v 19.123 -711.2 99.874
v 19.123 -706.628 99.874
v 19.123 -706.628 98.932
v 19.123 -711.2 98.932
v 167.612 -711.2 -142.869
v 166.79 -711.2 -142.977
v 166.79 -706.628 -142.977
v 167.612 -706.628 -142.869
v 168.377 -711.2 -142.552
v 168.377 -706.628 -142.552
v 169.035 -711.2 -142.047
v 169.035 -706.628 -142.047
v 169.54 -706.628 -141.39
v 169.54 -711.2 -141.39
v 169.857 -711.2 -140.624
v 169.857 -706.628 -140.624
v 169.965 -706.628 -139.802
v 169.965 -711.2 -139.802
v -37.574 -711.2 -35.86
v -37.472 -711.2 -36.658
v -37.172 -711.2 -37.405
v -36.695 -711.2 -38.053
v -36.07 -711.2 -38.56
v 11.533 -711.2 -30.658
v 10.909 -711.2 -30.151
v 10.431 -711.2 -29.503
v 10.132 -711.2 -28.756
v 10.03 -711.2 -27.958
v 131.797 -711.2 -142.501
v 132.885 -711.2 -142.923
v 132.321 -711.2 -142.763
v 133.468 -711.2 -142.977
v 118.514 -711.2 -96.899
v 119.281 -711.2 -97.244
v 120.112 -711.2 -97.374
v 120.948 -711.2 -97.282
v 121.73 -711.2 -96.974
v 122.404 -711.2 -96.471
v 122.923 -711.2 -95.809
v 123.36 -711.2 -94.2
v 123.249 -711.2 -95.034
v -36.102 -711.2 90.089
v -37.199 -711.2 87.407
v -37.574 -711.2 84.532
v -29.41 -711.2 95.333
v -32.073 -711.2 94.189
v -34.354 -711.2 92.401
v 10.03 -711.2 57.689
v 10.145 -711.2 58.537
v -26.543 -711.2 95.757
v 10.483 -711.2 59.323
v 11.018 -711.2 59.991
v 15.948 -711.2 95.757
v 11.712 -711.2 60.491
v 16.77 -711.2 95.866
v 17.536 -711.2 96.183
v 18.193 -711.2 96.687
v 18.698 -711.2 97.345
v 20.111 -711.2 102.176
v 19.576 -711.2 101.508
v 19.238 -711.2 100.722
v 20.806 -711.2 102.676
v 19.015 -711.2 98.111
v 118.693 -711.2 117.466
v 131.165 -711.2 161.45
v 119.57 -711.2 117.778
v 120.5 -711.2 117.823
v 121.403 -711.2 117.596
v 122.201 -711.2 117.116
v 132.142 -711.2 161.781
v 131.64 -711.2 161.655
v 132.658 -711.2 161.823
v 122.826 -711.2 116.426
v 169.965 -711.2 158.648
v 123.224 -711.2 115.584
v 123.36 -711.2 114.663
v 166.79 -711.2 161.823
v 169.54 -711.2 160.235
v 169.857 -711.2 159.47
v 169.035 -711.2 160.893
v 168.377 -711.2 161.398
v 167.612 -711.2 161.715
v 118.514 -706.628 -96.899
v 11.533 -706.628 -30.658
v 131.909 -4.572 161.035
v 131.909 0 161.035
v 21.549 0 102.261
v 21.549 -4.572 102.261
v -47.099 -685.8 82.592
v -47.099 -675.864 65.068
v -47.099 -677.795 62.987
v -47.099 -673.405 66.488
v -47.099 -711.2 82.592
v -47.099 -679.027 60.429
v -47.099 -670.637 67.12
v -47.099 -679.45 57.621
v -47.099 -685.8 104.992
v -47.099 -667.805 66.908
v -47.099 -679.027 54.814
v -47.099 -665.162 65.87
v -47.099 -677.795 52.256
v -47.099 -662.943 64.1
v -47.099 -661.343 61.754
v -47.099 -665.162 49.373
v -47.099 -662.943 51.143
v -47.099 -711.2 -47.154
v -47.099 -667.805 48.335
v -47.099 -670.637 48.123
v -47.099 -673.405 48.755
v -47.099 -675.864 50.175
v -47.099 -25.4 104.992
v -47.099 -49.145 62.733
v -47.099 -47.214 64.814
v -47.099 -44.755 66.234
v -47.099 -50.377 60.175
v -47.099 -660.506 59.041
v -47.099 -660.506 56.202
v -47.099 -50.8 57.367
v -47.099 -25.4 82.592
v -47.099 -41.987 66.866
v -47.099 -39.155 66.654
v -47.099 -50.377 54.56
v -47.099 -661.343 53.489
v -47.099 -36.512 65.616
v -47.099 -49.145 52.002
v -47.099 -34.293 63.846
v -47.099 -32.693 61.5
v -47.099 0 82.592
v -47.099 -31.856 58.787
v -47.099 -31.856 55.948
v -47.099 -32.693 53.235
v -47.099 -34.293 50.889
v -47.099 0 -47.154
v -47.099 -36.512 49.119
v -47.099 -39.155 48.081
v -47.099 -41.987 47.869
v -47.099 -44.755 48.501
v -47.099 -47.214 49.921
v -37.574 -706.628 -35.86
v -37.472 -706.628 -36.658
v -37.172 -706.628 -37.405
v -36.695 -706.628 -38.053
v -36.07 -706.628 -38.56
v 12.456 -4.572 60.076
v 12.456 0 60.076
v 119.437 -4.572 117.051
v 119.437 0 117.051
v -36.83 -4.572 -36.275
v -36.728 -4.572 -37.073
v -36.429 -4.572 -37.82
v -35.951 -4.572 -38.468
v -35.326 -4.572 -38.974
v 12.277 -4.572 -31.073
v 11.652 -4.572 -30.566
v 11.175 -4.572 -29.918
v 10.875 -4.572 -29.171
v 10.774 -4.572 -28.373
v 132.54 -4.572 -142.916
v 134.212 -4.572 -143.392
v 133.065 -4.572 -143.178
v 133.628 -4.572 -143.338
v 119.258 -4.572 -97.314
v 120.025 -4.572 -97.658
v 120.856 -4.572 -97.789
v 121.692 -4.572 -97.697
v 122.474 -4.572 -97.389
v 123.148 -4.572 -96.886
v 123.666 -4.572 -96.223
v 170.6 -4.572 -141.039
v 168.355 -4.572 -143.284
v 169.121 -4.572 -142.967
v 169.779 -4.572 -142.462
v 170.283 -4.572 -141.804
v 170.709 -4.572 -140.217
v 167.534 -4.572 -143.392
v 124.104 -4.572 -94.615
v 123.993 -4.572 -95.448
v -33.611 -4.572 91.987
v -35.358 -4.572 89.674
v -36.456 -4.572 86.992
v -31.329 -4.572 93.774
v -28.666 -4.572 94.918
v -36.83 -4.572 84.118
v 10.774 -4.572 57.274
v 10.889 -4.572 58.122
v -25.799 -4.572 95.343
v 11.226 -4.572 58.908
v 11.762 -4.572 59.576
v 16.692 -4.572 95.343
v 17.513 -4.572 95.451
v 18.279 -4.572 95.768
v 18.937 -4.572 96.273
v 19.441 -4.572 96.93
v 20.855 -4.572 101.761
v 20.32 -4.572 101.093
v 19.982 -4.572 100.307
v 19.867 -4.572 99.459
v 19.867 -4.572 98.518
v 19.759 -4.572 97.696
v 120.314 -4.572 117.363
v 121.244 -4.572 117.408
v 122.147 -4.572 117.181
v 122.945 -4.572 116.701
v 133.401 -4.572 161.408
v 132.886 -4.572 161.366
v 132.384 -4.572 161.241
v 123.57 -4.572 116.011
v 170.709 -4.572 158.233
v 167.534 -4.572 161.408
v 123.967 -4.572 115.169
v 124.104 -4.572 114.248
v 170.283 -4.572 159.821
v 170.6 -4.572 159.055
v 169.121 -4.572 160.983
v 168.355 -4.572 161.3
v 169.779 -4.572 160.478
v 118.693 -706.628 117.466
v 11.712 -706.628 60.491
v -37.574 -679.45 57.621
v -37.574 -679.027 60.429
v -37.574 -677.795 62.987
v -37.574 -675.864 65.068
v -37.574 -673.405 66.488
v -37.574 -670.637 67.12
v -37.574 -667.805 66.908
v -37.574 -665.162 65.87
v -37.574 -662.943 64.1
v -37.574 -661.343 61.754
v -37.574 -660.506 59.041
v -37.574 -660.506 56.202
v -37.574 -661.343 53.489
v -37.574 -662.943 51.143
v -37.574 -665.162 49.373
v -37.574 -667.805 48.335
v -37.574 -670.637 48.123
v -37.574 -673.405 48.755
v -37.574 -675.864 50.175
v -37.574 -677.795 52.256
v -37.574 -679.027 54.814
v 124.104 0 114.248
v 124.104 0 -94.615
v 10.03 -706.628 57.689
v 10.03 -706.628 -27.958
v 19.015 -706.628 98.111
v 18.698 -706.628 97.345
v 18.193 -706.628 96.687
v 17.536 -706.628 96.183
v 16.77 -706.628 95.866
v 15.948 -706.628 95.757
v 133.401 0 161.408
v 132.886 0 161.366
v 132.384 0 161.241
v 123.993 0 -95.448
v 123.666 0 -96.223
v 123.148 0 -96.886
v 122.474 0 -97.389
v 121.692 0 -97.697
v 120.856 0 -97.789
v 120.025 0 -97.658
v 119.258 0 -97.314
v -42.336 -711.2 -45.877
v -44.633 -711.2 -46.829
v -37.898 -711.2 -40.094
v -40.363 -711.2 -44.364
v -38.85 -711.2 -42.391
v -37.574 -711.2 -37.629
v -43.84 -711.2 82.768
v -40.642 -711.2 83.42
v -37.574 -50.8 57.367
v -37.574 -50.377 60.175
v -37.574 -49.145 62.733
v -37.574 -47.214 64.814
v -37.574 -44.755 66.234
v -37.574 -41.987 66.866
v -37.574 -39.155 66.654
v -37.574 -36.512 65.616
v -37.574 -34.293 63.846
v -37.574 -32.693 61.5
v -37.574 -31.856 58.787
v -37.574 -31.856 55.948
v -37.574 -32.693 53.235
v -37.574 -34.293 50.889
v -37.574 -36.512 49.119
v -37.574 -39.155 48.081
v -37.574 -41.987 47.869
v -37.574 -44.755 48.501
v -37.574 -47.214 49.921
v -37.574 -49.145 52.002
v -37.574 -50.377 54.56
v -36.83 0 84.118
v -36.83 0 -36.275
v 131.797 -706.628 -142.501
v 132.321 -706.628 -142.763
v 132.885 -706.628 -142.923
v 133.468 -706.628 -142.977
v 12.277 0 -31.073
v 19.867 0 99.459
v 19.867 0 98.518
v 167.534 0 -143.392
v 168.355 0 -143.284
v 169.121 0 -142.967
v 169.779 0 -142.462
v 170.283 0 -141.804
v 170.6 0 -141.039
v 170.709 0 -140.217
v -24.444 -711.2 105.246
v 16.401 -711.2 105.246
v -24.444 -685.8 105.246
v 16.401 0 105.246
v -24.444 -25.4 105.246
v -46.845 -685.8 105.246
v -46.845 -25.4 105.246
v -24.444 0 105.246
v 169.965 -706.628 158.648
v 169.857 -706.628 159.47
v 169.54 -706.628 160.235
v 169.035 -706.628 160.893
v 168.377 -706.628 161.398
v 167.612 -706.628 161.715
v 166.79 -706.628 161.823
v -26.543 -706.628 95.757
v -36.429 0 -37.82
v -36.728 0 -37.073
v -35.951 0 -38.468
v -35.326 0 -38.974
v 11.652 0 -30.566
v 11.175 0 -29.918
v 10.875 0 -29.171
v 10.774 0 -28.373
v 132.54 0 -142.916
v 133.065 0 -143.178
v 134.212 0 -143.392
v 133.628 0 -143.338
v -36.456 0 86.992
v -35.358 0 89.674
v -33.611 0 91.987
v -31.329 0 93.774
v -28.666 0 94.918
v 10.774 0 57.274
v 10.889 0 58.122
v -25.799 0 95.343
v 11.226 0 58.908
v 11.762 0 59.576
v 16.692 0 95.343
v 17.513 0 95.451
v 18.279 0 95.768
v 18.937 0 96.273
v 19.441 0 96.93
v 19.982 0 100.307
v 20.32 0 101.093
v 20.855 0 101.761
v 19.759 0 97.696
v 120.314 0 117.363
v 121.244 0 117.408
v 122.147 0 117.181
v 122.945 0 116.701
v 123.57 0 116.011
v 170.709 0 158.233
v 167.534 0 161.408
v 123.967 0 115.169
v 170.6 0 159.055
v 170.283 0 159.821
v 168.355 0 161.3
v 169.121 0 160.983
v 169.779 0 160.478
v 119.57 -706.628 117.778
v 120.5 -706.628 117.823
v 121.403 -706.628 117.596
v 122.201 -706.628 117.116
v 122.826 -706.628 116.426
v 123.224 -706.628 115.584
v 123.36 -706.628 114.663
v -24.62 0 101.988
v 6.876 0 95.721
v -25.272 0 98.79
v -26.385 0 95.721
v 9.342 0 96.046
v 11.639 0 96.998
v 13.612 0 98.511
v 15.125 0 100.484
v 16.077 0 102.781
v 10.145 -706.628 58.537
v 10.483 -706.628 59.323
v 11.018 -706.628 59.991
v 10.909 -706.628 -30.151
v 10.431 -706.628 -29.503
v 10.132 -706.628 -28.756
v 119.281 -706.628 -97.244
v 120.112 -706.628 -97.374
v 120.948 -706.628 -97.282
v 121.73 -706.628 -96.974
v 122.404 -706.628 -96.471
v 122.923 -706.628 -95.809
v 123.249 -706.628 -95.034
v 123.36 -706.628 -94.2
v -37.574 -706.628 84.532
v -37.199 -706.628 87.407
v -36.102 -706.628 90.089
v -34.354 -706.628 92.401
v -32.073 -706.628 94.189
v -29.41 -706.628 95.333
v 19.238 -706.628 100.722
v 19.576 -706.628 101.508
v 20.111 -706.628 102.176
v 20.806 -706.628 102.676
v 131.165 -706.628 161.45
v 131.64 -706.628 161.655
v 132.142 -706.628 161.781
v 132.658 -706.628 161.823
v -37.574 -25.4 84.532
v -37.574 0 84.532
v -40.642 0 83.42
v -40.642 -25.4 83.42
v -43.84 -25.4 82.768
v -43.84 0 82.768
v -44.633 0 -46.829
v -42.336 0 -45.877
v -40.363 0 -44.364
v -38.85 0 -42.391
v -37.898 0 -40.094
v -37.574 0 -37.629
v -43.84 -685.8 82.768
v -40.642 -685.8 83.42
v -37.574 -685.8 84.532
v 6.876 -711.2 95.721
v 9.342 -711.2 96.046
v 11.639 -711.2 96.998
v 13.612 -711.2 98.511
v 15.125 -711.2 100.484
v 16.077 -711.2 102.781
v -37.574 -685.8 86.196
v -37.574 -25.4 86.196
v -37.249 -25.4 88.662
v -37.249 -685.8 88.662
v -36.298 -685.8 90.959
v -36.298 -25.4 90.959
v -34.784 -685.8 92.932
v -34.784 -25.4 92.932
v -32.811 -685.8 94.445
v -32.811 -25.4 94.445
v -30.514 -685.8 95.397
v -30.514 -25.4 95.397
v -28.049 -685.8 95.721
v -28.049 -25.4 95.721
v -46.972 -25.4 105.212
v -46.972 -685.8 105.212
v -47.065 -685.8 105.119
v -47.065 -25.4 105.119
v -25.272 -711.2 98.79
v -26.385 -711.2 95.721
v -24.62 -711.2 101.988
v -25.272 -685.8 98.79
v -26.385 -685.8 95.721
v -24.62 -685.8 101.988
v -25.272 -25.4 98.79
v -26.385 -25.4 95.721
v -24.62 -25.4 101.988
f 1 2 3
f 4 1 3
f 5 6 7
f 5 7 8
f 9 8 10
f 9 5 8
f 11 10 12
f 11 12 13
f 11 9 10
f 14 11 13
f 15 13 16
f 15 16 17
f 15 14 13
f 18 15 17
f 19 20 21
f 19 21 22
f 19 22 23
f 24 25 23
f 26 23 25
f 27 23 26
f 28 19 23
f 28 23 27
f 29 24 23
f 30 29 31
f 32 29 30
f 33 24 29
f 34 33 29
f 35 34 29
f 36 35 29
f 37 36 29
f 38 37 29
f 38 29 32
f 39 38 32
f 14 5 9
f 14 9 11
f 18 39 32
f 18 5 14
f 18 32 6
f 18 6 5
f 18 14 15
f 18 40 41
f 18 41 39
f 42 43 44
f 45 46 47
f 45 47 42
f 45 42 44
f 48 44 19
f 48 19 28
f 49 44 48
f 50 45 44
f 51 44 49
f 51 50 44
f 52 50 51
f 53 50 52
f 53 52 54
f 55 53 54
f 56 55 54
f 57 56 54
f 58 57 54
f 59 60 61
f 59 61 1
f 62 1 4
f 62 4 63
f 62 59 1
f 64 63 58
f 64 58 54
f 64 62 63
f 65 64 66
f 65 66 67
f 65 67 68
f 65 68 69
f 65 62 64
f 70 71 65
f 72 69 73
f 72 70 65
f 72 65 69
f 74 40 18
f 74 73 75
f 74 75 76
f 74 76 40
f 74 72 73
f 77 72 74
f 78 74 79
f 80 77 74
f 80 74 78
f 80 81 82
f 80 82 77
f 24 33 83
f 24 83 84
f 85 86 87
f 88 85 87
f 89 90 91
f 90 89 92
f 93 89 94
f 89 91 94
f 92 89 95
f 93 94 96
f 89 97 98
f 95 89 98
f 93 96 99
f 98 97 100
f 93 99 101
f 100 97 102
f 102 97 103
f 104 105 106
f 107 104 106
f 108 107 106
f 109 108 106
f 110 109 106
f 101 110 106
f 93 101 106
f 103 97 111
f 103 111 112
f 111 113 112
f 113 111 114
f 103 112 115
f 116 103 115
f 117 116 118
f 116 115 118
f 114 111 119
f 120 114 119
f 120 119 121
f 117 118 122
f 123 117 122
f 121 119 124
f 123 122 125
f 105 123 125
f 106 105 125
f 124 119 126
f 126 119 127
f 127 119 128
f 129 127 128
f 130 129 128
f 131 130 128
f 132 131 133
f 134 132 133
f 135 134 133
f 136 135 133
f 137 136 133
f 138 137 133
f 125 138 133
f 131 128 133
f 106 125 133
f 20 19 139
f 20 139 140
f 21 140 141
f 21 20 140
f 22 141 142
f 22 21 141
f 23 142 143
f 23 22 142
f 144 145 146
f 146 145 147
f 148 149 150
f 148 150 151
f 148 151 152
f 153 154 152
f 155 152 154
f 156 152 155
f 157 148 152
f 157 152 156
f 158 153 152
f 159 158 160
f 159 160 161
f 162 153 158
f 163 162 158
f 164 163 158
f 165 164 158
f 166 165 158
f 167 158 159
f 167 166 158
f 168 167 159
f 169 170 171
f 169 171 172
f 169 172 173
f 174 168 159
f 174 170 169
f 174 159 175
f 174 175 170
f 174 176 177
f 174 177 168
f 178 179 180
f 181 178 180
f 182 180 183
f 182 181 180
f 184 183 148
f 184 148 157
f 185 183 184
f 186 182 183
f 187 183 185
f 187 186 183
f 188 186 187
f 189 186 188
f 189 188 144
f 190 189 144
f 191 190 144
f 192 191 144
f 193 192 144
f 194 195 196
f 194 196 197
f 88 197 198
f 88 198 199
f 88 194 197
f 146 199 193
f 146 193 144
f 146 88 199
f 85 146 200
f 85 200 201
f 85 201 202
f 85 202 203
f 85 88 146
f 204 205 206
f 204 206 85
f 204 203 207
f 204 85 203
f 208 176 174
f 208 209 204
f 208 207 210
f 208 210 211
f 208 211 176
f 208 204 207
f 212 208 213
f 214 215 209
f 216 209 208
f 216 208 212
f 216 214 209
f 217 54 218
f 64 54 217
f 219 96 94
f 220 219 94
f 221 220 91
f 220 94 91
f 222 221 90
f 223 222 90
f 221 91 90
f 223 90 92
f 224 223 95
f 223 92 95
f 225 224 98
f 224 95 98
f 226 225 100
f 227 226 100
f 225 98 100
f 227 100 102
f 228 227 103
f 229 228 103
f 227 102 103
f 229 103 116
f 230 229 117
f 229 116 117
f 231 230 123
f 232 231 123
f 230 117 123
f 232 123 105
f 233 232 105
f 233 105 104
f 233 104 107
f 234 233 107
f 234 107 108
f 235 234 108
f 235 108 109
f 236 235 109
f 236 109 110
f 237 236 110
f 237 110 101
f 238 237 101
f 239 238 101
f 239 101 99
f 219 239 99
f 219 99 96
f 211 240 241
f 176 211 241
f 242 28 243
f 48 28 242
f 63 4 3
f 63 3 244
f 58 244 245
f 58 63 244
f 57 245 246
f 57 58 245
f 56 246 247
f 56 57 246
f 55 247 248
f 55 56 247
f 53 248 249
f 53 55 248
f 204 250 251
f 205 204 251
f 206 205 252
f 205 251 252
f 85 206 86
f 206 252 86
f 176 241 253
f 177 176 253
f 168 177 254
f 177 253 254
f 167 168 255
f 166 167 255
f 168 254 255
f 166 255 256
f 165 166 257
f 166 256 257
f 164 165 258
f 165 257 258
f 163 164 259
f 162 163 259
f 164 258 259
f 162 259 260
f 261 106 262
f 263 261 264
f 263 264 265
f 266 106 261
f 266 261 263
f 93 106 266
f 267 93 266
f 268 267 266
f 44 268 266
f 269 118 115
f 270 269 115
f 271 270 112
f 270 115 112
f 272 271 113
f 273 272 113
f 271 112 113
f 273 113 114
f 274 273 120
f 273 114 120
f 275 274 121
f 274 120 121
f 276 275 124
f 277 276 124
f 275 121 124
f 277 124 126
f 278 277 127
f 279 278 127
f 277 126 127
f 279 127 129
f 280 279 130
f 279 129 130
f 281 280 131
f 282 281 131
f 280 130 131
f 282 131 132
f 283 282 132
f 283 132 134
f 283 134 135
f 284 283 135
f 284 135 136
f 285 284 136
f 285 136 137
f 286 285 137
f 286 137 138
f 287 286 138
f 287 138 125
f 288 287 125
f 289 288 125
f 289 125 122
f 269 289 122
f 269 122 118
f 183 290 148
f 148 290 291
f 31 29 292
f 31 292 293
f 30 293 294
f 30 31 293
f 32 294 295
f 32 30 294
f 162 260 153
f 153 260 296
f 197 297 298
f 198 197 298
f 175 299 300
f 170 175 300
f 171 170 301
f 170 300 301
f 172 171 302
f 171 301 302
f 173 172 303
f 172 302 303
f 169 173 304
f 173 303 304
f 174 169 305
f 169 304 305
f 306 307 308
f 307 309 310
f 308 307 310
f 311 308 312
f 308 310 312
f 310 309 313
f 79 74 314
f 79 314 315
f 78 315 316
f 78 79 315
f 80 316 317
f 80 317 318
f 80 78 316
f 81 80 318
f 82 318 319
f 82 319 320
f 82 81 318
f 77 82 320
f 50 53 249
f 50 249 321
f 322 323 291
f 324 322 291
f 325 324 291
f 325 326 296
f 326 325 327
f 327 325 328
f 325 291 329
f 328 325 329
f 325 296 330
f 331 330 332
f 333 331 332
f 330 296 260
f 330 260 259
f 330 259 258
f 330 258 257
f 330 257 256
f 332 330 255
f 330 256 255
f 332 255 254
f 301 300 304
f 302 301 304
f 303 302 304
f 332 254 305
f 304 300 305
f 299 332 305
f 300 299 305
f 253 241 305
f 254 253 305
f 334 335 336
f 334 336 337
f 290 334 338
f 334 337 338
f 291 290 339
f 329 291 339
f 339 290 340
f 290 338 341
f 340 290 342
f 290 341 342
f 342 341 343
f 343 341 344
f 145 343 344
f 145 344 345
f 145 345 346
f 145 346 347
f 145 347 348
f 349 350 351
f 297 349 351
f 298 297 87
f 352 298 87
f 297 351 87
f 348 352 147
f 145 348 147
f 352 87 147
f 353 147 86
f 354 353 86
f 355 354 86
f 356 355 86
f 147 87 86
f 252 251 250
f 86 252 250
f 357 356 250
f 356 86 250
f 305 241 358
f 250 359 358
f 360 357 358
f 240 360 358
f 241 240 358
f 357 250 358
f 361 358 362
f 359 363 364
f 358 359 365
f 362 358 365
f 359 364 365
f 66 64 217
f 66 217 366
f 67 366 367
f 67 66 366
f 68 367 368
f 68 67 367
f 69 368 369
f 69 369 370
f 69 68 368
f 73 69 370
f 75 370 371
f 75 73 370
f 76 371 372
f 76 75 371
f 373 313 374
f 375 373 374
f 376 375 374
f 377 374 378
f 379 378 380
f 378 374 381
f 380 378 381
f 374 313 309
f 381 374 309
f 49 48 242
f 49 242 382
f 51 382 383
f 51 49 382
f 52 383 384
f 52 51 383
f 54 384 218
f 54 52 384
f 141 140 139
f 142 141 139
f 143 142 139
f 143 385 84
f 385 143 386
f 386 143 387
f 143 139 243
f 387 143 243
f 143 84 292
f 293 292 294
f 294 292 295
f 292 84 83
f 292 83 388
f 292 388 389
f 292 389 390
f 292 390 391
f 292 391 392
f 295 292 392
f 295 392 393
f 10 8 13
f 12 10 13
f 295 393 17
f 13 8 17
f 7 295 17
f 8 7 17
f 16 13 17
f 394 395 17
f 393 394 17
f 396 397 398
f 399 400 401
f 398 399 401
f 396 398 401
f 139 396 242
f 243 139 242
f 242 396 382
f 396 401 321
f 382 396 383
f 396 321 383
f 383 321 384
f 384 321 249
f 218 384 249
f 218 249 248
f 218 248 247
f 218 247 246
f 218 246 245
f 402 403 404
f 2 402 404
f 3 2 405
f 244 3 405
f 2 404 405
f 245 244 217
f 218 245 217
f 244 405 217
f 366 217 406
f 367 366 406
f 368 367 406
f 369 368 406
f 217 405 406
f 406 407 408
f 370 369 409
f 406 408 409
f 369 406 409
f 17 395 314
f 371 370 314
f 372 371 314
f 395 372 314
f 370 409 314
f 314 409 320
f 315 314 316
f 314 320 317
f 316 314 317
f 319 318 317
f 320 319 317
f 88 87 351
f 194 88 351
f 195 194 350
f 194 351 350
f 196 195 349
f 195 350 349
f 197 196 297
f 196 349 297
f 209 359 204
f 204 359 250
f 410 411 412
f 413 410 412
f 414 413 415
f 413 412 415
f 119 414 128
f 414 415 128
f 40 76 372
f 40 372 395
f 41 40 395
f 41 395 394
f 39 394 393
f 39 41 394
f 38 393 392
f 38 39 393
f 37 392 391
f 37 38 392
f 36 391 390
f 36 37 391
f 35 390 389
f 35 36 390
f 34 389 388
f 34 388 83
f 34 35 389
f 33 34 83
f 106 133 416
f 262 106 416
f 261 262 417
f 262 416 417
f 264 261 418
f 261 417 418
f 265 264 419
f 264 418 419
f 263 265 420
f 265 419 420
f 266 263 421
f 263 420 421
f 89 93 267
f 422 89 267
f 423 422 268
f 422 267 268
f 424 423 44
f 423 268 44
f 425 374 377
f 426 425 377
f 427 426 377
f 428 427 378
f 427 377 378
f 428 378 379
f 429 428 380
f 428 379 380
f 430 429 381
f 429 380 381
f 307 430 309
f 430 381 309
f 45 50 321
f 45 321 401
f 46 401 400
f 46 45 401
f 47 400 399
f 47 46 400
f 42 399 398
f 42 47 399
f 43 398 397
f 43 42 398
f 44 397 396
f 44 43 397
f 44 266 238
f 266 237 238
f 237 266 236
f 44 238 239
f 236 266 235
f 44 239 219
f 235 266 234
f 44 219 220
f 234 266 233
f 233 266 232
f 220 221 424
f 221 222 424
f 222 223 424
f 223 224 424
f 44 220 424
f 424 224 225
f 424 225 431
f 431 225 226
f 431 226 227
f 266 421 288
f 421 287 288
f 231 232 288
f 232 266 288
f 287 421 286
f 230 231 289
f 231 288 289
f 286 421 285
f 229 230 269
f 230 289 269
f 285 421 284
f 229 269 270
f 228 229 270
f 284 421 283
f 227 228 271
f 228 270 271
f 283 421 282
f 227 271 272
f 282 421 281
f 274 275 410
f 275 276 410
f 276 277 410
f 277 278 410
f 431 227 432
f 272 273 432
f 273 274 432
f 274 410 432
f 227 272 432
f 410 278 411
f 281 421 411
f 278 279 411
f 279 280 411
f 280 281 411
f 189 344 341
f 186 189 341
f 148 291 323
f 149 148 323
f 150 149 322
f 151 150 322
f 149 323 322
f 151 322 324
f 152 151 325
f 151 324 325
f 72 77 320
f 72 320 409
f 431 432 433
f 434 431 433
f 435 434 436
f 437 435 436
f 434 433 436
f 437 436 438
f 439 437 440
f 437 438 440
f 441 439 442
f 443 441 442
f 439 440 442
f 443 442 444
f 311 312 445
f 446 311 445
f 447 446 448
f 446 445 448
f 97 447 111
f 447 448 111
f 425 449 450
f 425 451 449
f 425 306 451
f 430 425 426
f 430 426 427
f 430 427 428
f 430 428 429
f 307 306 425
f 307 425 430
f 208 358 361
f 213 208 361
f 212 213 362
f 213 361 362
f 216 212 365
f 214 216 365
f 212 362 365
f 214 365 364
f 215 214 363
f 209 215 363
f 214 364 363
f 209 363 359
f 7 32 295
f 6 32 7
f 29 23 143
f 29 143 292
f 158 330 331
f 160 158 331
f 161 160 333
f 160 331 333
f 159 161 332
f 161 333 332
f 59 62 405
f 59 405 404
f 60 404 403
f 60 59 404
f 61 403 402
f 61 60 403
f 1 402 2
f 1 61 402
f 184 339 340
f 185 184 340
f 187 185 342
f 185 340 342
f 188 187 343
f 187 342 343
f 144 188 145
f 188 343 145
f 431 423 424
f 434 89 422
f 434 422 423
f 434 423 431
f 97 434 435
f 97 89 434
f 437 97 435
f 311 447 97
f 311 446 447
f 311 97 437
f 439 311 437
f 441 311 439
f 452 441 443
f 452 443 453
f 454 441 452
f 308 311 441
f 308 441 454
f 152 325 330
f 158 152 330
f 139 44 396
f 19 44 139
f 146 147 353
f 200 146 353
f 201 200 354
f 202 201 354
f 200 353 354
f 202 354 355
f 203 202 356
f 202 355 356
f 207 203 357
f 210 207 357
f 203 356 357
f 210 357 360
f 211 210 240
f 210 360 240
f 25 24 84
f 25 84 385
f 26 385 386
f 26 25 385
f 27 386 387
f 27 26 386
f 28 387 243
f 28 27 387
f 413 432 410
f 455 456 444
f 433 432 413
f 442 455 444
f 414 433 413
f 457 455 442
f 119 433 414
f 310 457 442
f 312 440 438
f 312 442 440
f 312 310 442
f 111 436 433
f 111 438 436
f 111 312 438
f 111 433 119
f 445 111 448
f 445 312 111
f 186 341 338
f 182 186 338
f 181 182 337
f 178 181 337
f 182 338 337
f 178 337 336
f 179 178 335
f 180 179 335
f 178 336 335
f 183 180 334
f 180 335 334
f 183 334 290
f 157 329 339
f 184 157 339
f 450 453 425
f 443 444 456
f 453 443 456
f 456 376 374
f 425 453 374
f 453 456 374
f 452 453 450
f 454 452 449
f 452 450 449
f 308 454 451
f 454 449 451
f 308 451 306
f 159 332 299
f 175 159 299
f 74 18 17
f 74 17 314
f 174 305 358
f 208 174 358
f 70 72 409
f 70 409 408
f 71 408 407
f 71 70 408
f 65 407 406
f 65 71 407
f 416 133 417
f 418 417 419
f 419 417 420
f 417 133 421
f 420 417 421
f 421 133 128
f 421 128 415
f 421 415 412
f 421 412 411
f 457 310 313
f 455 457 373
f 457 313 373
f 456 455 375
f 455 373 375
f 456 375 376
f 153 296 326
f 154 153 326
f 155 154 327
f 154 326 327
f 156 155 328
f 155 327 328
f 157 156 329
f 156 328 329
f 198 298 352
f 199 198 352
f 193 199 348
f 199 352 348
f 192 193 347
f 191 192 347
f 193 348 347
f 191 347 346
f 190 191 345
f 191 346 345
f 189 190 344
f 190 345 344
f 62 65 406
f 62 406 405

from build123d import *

# Parameters (mm, degrees)
F1_DEPTH  = 711.2
F2_R      = 22.225
F3_DEPTH  = 25.4
F4_R      = 22.225
F5_DEPTH  = 25.4
F6_R      = 9.525
F7_DEPTH  = 63.501
F9_DEPTH  = 4.572
F11_DEPTH = 4.572


with BuildPart() as f1:
    # F0 (on Front) → F1 (new body)
    with BuildSketch(Plane.XZ):
        with BuildLine():
            ThreePointArc((-46.844614, 105.246472), (-47.024219, 105.172077), (-47.098614, 104.992472))
            Line((-47.098614, 104.992472), (-47.098614, -47.153528))
            ThreePointArc((-47.098614, -47.153528), (-40.363422, -44.36372), (-37.573614, -37.628528))
            Line((-37.573614, -37.628528), (-37.573614, 86.196472))
            ThreePointArc((-37.573614, 86.196472), (-34.783806, 92.931664), (-28.048614, 95.721472))
            Line((-28.048614, 95.721472), (6.876386, 95.721472))
            ThreePointArc((6.876386, 95.721472), (13.611578, 98.51128), (16.401386, 105.246472))
            Line((16.401386, 105.246472), (-46.844614, 105.246472))
        make_face()
    extrude(amount=F1_DEPTH)

    # F2 (on face) → F3 (cut)
    with BuildSketch(Plane.XZ.offset(711.2)):
        with Locations((-46.665009, 104.812867)):
            Circle(F2_R)
    extrude(amount=-F3_DEPTH, mode=Mode.SUBTRACT)

    # F4 (on face) → F5 (cut)
    with BuildSketch(Plane(origin=(0, 0, 0), x_dir=(-1, 0, 0), z_dir=(0, 1, 0))):
        with Locations((46.665009, 104.812867)):
            Circle(F4_R)
    extrude(amount=-F5_DEPTH, mode=Mode.SUBTRACT)

    # F6 (on face) → F7 (cut, through all)
    with BuildSketch(Plane(origin=(-47.098614, 0, 0), x_dir=(0, -1, 0), z_dir=(-1, 0, 0))):
        with Locations((41.275, 57.367472)):
            Circle(F6_R)
        with Locations((669.925, 57.621472)):
            Circle(F6_R)
    extrude(amount=-F7_DEPTH, mode=Mode.SUBTRACT)


with BuildPart() as f9:
    # F8 (on face) → F9 (new body)
    with BuildSketch(Plane.XZ.offset(711.2)):
        with BuildLine():
            Line((131.165237, 161.450276), (20.805644, 102.675902))
            ThreePointArc((20.805644, 102.675902), (19.576044, 101.507878), (19.1231, 99.873546))
            Line((19.1231, 99.873546), (19.1231, 98.932497))
            ThreePointArc((19.1231, 98.932497), (18.193164, 96.687433), (15.9481, 95.757497))
            Line((15.9481, 95.757497), (-26.542613, 95.757497))
            ThreePointArc((-26.542613, 95.757497), (-34.354287, 92.401421), (-37.573614, 84.532404))
            Line((-37.573614, 84.532404), (-37.573614, -35.860095))
            ThreePointArc((-37.573614, -35.860095), (-37.172376, -37.405044), (-36.070075, -38.55951))
            Line((-36.070075, -38.55951), (131.796578, -142.501495))
            ThreePointArc((131.796578, -142.501495), (132.599137, -142.85587), (133.468039, -142.97708))
            Line((133.468039, -142.97708), (166.789943, -142.97708))
            ThreePointArc((166.789943, -142.97708), (169.035007, -142.047144), (169.964943, -139.80208))
            Line((169.964943, -139.80208), (169.964943, 158.64792))
            ThreePointArc((169.964943, 158.64792), (169.035007, 160.892984), (166.789943, 161.82292))
            Line((166.789943, 161.82292), (132.657692, 161.82292))
            ThreePointArc((132.657692, 161.82292), (131.888556, 161.728351), (131.165237, 161.450276))
        make_face()
        with BuildLine():
            ThreePointArc((118.692944, 117.465699), (121.819731, 117.385397), (123.360399, 114.663342))
            Line((123.360399, 114.663342), (123.360399, -94.199964))
            ThreePointArc((123.360399, -94.199964), (121.730349, -96.973726), (118.513938, -96.899379))
            Line((118.513938, -96.899379), (11.533456, -30.657732))
            ThreePointArc((11.533456, -30.657732), (10.431155, -29.503266), (10.029917, -27.958316))
            Line((10.029917, -27.958316), (10.029917, 57.688586))
            ThreePointArc((10.029917, 57.688586), (10.482862, 59.322918), (11.712462, 60.490943))
            Line((11.712462, 60.490943), (118.692944, 117.465699))
        make_face(mode=Mode.SUBTRACT)
    extrude(amount=-F9_DEPTH)


with BuildPart() as f11:
    # F10 (on Front) → F11 (new body)
    with BuildSketch(Plane.XZ):
        with BuildLine():
            Line((131.908847, 161.03541), (21.549254, 102.261036))
            ThreePointArc((21.549254, 102.261036), (20.319654, 101.093011), (19.86671, 99.458679))
            Line((19.86671, 99.458679), (19.86671, 98.51763))
            ThreePointArc((19.86671, 98.51763), (18.936774, 96.272566), (16.69171, 95.34263))
            Line((16.69171, 95.34263), (-25.799003, 95.34263))
            ThreePointArc((-25.799003, 95.34263), (-33.610677, 91.986554), (-36.830004, 84.117538))
            Line((-36.830004, 84.117538), (-36.830004, -36.274961))
            ThreePointArc((-36.830004, -36.274961), (-36.428767, -37.819911), (-35.326465, -38.974377))
            Line((-35.326465, -38.974377), (132.540188, -142.916362))
            ThreePointArc((132.540188, -142.916362), (133.342747, -143.270737), (134.211649, -143.391947))
            Line((134.211649, -143.391947), (167.533553, -143.391947))
            ThreePointArc((167.533553, -143.391947), (169.778617, -142.462011), (170.708553, -140.216947))
            Line((170.708553, -140.216947), (170.708553, 158.233053))
            ThreePointArc((170.708553, 158.233053), (169.778617, 160.478117), (167.533553, 161.408053))
            Line((167.533553, 161.408053), (133.401302, 161.408053))
            ThreePointArc((133.401302, 161.408053), (132.632166, 161.313484), (131.908847, 161.03541))
        make_face()
        with BuildLine():
            ThreePointArc((119.436554, 117.050832), (122.563341, 116.970531), (124.104009, 114.248476))
            Line((124.104009, 114.248476), (124.104009, -94.61483))
            ThreePointArc((124.104009, -94.61483), (122.473958, -97.388593), (119.257548, -97.314246))
            Line((119.257548, -97.314246), (12.277066, -31.072598))
            ThreePointArc((12.277066, -31.072598), (11.174765, -29.918132), (10.773527, -28.373183))
            Line((10.773527, -28.373183), (10.773527, 57.27372))
            ThreePointArc((10.773527, 57.27372), (11.226472, 58.908051), (12.456072, 60.076076))
            Line((12.456072, 60.076076), (119.436554, 117.050832))
        make_face(mode=Mode.SUBTRACT)
    extrude(amount=F11_DEPTH)


solid = Compound([f1.part, f9.part, f11.part])
